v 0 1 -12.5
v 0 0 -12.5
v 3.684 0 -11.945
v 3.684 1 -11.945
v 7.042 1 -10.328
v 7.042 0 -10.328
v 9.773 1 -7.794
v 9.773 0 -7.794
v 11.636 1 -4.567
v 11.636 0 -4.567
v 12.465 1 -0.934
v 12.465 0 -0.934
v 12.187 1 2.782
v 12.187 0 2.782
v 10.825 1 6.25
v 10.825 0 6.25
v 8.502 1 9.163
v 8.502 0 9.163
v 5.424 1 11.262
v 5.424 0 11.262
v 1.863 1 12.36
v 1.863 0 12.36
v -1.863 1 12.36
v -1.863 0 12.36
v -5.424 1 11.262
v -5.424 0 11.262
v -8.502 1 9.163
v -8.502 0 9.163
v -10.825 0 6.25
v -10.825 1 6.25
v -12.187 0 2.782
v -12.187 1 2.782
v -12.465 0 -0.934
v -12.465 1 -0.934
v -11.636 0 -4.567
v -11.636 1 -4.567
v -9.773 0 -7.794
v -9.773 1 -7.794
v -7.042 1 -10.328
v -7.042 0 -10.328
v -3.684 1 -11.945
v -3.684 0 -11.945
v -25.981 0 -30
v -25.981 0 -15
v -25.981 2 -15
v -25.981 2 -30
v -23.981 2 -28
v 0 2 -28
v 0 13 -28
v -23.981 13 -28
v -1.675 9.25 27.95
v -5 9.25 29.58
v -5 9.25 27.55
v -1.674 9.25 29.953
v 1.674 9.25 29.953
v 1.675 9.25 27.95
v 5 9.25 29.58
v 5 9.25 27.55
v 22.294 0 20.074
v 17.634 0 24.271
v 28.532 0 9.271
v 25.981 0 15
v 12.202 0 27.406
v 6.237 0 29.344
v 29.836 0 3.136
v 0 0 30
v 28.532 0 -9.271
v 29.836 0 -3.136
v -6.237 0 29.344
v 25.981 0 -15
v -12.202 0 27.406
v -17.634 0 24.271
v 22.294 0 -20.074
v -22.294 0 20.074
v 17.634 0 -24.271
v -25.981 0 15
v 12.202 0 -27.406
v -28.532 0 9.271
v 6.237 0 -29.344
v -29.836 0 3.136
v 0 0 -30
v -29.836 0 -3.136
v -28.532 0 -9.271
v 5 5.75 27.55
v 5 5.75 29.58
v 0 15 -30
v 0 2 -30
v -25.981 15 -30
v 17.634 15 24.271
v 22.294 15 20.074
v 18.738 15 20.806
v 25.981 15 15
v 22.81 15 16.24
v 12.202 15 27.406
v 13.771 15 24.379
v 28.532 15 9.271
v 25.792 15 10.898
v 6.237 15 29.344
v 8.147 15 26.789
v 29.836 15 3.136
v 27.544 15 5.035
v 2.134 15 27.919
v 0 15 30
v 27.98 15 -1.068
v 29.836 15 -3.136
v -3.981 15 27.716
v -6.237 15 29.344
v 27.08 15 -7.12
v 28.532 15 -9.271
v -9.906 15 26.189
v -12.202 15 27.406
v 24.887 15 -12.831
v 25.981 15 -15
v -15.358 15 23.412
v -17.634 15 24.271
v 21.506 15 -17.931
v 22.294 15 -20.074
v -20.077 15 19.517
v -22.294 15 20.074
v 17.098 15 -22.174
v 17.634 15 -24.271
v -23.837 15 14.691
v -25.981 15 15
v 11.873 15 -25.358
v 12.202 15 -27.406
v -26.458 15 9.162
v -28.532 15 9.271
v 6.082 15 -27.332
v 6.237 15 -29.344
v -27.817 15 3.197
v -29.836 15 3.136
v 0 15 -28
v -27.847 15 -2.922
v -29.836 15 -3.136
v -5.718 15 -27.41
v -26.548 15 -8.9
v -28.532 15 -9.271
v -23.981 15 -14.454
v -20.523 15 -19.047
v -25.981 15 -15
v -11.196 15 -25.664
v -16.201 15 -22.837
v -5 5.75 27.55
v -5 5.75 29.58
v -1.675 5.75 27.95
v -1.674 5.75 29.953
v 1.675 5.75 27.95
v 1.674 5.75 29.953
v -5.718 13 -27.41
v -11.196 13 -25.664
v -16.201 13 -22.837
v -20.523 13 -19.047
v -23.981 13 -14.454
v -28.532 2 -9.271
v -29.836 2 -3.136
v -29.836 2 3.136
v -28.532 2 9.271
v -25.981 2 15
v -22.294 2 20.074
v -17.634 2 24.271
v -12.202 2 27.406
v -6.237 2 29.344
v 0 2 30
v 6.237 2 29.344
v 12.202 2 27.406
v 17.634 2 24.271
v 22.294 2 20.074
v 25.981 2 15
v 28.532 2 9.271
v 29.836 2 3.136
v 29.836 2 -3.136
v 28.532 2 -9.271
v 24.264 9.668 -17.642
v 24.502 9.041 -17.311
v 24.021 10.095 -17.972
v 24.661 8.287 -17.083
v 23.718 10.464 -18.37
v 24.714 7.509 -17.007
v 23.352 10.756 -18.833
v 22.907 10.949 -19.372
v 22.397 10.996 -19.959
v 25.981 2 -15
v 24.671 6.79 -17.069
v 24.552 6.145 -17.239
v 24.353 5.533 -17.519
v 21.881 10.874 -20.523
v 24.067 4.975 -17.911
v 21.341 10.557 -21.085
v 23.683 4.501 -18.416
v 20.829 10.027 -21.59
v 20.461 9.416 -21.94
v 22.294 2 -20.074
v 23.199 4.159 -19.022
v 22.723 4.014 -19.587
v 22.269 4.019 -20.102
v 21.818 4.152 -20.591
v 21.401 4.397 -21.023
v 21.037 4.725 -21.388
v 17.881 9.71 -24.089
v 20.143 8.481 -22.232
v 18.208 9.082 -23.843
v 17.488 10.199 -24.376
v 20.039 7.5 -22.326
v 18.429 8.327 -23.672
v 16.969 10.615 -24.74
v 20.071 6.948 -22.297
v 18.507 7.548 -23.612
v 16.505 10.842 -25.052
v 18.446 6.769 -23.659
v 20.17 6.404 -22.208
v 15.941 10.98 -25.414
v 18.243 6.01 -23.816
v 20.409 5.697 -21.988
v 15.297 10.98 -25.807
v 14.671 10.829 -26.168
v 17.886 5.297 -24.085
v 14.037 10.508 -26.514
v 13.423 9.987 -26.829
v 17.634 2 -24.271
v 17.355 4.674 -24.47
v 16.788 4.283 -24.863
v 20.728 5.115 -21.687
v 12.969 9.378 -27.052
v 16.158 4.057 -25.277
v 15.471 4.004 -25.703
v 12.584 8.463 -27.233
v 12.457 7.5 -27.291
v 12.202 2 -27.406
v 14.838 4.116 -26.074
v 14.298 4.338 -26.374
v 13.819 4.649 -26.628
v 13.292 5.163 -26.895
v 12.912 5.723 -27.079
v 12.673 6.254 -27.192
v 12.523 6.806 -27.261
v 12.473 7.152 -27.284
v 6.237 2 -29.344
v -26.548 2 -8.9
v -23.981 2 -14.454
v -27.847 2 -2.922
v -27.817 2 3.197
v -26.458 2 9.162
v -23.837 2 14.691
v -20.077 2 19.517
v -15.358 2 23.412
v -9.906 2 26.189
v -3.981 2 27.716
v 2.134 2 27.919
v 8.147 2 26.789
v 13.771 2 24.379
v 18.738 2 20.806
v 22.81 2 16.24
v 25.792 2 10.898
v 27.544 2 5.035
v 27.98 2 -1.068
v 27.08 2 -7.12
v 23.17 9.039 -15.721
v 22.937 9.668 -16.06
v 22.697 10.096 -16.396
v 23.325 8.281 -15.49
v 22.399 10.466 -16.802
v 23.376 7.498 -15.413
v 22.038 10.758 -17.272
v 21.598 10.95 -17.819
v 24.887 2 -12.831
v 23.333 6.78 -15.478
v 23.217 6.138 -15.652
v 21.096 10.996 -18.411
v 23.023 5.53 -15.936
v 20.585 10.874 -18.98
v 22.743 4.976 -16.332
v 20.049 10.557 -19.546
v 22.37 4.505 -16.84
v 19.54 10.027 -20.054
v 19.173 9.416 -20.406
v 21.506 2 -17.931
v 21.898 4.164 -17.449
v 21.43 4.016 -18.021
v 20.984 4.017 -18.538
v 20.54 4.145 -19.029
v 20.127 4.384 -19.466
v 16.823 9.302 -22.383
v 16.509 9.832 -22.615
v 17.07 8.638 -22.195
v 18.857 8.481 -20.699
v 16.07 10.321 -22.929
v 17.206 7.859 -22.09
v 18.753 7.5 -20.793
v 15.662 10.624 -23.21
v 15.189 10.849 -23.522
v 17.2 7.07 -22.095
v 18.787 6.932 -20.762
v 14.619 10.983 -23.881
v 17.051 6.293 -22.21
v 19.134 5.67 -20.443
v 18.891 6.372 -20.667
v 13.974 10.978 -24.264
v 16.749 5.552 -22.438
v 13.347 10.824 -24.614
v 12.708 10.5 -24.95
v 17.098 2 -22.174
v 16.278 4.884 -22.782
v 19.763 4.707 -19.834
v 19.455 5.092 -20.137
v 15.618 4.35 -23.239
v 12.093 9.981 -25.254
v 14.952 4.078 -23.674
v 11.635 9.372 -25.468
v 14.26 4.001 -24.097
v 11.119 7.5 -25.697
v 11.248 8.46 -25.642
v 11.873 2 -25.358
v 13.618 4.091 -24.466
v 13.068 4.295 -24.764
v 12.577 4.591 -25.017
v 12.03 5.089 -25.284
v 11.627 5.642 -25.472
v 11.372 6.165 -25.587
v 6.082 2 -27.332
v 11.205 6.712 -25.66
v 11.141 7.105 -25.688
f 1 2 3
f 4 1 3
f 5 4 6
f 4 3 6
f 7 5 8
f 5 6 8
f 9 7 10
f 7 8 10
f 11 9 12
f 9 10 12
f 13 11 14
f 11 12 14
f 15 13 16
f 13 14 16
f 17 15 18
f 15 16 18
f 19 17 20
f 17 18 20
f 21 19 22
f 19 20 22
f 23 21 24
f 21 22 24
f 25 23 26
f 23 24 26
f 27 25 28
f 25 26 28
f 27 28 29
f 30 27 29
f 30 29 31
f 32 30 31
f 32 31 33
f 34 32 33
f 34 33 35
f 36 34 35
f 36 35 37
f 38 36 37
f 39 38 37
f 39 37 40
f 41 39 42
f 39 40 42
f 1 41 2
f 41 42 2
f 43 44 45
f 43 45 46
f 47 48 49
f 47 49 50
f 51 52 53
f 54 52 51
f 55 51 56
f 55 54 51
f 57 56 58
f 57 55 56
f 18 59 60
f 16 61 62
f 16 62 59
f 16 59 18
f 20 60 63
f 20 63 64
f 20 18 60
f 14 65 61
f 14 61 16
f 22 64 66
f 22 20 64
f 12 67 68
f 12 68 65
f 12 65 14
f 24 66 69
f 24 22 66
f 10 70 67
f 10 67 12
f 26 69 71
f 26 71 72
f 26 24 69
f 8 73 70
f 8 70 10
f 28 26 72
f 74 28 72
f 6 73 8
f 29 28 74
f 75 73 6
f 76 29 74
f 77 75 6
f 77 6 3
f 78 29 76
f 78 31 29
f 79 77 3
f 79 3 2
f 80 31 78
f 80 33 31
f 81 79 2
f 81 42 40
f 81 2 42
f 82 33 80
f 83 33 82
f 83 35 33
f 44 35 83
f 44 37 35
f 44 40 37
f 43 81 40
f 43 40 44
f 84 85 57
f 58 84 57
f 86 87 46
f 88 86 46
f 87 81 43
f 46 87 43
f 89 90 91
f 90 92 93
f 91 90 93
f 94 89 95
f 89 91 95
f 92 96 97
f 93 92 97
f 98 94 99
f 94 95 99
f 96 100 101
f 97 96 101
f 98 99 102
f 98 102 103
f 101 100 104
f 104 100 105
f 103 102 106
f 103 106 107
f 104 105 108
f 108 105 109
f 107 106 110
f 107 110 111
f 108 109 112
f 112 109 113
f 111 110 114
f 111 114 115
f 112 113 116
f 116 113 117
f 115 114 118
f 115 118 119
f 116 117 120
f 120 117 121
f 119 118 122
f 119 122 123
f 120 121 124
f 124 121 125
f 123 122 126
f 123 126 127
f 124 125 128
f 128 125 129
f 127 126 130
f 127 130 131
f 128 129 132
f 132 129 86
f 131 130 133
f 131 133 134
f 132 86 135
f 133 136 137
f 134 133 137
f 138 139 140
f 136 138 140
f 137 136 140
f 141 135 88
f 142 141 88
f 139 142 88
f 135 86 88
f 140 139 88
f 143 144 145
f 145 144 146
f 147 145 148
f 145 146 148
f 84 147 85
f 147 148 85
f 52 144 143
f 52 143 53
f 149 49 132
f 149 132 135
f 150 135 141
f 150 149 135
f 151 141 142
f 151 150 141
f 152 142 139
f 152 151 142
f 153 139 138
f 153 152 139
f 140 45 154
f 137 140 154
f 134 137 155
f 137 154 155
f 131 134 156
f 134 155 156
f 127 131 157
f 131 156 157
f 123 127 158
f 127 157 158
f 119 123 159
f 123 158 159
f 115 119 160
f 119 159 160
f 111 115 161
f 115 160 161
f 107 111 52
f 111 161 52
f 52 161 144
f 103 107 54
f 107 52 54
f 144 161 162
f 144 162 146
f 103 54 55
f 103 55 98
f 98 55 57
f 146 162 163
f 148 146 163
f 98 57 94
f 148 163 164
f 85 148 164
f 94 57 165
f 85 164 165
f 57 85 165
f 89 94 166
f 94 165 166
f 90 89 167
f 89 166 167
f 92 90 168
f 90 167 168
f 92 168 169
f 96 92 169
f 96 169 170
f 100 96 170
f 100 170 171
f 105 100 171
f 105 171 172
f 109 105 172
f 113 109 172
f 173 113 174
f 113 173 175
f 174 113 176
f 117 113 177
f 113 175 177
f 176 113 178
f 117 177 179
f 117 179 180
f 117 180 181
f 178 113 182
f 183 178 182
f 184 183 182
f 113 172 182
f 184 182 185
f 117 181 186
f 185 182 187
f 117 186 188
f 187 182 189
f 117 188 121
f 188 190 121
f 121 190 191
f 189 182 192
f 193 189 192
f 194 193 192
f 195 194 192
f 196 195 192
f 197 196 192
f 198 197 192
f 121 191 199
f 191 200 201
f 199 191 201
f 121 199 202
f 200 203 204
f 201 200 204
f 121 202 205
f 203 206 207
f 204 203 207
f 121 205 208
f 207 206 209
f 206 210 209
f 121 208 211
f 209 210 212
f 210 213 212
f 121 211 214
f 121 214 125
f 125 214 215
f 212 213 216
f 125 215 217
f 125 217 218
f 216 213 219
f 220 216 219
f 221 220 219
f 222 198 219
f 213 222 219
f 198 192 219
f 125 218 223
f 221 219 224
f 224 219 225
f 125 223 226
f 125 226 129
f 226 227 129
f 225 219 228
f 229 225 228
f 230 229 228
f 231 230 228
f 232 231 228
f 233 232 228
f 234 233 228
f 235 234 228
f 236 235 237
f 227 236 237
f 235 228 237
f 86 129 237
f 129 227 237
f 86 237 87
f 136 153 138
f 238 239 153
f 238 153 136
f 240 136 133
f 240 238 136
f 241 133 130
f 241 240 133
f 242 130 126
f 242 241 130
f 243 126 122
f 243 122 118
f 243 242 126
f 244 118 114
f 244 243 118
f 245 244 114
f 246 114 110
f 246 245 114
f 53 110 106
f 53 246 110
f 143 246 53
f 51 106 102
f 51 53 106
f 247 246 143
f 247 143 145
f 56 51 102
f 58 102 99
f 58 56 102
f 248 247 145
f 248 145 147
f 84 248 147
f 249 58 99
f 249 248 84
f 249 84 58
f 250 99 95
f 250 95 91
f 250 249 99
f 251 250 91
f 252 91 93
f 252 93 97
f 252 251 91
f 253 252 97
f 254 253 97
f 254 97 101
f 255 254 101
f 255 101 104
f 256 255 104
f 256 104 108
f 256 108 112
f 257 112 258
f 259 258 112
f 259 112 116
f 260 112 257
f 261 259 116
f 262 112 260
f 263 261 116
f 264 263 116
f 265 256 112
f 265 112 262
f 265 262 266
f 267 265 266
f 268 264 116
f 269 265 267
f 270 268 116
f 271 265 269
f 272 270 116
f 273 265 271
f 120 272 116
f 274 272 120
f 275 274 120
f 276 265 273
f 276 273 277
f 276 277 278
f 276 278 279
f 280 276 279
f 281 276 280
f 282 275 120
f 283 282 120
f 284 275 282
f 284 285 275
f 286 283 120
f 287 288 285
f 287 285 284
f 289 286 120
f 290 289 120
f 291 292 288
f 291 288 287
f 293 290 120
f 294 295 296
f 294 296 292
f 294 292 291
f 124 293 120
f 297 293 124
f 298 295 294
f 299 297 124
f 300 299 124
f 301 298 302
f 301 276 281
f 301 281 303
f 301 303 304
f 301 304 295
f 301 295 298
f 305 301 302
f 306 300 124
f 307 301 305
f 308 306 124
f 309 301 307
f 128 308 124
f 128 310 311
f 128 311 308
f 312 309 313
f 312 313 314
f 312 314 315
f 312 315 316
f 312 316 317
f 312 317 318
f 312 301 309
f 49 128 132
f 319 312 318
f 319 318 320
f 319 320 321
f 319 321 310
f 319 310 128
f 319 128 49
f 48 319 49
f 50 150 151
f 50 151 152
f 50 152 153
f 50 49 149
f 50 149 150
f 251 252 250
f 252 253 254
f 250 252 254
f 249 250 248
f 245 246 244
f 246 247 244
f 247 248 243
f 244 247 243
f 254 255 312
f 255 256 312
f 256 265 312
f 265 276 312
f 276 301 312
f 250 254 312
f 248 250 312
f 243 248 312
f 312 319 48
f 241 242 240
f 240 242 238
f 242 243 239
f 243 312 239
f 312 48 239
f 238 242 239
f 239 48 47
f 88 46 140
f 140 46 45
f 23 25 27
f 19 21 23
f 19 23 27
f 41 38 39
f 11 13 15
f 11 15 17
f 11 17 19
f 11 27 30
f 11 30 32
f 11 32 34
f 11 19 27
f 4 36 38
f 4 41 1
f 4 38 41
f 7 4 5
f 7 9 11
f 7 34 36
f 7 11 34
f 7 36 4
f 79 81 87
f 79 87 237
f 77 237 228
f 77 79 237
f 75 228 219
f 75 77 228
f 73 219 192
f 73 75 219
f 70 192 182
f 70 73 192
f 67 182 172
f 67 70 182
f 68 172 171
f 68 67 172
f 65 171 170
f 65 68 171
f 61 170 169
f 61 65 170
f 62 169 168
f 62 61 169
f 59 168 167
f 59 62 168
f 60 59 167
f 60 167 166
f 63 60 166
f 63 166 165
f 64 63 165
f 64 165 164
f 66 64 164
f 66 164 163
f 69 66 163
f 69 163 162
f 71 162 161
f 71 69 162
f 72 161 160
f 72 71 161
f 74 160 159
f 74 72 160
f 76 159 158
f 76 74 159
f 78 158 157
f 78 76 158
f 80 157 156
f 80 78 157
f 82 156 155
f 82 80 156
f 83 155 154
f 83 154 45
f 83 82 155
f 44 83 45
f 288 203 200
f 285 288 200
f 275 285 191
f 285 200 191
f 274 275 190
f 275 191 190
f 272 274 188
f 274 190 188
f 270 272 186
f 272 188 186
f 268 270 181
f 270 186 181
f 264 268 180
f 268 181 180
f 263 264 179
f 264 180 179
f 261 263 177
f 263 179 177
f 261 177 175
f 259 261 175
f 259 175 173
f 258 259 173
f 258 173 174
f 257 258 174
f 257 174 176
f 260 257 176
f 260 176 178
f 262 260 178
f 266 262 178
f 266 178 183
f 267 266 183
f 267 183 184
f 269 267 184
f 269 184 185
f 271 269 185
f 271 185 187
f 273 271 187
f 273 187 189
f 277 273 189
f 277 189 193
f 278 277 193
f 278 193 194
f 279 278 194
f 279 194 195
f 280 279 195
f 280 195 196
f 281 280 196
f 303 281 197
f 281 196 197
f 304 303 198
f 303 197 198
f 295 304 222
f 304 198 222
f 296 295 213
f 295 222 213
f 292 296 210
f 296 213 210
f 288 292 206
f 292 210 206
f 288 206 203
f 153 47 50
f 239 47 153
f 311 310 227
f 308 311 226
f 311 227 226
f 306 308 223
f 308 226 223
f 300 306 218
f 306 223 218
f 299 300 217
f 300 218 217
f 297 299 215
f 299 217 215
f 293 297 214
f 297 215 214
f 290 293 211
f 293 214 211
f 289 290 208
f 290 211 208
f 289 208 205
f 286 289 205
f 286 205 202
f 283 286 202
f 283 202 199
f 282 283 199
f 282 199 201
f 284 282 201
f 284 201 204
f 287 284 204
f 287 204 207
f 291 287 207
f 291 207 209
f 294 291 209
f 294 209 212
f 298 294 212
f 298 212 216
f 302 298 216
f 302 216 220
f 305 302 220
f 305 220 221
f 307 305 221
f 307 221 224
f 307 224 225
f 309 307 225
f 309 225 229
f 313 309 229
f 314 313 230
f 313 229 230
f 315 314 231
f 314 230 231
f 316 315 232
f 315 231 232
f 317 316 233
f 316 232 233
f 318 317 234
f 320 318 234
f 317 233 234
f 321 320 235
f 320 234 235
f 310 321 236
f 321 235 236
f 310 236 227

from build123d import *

# Parameters (mm, degrees)
BOSS_EXTRUDE1_DEPTH      = 2
BOSS_EXTRUDE2_DEPTH      = 13
BOSS_EXTRUDE3_START      = -2
BOSS_EXTRUDE3_DEPTH      = 2
SKETCH4_R                = 12.5
CUT_EXTRUDE2_DEPTH       = 1
SKETCH5_W                = 10
SKETCH5_H                = 3.5
USB_C_CUT_DEPTH          = 4
SKETCH6_R                = 3.5
VOLUME_BUTTONS_CUT_DEPTH = 4


with BuildPart() as part:
    # Sketch1 → Boss-Extrude1 (new body)
    with BuildSketch(Plane(origin=(0, 0, 0), x_dir=(1, 0, 0), z_dir=(0, 1, 0))):
        with BuildLine():
            Line((-25.980762114, 15), (-25.980762114, 30))
            Line((-25.980762114, 30), (0, 30))
            ThreePointArc((0, 30), (15, -25.980762114), (-25.980762114, 15))
        make_face()
    extrude(amount=BOSS_EXTRUDE1_DEPTH)

    # Sketch2 → Boss-Extrude2 (add)
    with BuildSketch(Plane(origin=(0, 2, 0), x_dir=(1, 0, 0), z_dir=(0, 1, 0))):
        with BuildLine():
            Line((0, 30), (-25.980762114, 30))
            Line((-25.980762114, 30), (-25.980762114, 15))
            ThreePointArc((-25.980762114, 15), (15, -25.980762114), (0, 30))
        make_face()
        with BuildLine():
            Line((0, 28), (-23.980762114, 28))
            Line((-23.980762114, 28), (-23.980762114, 14.454170625))
            ThreePointArc((-23.980762114, 14.454170625), (13.77104249, -24.379466539), (0, 28))
        make_face(mode=Mode.SUBTRACT)
    extrude(amount=BOSS_EXTRUDE2_DEPTH)

    # Sketch3 → Boss-Extrude3 (add)
    with BuildSketch(Plane(origin=(0, 15, 0), x_dir=(1, 0, 0), z_dir=(0, 1, 0)).offset(BOSS_EXTRUDE3_START)):
        with BuildLine():
            Line((-23.980762114, 14.454170625), (-23.980762114, 28))
            Line((-23.980762114, 28), (0, 28))
            ThreePointArc((0, 28), (-13.77104249, 24.379466539), (-23.980762114, 14.454170625))
        make_face()
    extrude(amount=BOSS_EXTRUDE3_DEPTH)

    # Sketch4 → Cut-Extrude2 (cut)
    with BuildSketch(Plane.XZ):
        with Locations(Location((0, 0, 0), (0, 0, 270))):
            Circle(SKETCH4_R)
    extrude(amount=-CUT_EXTRUDE2_DEPTH, mode=Mode.SUBTRACT)

    # Sketch5 → USB_C_Cut (cut)
    with BuildSketch(Plane.XY.offset(30)):
        with Locations((0, 7.5)):
            Rectangle(SKETCH5_W, SKETCH5_H)
    extrude(amount=-USB_C_CUT_DEPTH, mode=Mode.SUBTRACT)

    # Sketch6 → Volume_Buttons_Cut (cut)
    with BuildSketch(Plane(origin=(19.283628291, 0, -22.981333294), x_dir=(0, -1, 0), z_dir=(0.642787609686543, 0, -0.7660444431189749))):
        with Locations(Location((-7.5, 4.5, 0), (0, 0, 90))):
            Circle(SKETCH6_R)
        with Locations(Location((-7.5, -4.5, 0), (0, 0, 90))):
            Circle(SKETCH6_R)
    extrude(amount=-VOLUME_BUTTONS_CUT_DEPTH, mode=Mode.SUBTRACT)


solid = part.part
